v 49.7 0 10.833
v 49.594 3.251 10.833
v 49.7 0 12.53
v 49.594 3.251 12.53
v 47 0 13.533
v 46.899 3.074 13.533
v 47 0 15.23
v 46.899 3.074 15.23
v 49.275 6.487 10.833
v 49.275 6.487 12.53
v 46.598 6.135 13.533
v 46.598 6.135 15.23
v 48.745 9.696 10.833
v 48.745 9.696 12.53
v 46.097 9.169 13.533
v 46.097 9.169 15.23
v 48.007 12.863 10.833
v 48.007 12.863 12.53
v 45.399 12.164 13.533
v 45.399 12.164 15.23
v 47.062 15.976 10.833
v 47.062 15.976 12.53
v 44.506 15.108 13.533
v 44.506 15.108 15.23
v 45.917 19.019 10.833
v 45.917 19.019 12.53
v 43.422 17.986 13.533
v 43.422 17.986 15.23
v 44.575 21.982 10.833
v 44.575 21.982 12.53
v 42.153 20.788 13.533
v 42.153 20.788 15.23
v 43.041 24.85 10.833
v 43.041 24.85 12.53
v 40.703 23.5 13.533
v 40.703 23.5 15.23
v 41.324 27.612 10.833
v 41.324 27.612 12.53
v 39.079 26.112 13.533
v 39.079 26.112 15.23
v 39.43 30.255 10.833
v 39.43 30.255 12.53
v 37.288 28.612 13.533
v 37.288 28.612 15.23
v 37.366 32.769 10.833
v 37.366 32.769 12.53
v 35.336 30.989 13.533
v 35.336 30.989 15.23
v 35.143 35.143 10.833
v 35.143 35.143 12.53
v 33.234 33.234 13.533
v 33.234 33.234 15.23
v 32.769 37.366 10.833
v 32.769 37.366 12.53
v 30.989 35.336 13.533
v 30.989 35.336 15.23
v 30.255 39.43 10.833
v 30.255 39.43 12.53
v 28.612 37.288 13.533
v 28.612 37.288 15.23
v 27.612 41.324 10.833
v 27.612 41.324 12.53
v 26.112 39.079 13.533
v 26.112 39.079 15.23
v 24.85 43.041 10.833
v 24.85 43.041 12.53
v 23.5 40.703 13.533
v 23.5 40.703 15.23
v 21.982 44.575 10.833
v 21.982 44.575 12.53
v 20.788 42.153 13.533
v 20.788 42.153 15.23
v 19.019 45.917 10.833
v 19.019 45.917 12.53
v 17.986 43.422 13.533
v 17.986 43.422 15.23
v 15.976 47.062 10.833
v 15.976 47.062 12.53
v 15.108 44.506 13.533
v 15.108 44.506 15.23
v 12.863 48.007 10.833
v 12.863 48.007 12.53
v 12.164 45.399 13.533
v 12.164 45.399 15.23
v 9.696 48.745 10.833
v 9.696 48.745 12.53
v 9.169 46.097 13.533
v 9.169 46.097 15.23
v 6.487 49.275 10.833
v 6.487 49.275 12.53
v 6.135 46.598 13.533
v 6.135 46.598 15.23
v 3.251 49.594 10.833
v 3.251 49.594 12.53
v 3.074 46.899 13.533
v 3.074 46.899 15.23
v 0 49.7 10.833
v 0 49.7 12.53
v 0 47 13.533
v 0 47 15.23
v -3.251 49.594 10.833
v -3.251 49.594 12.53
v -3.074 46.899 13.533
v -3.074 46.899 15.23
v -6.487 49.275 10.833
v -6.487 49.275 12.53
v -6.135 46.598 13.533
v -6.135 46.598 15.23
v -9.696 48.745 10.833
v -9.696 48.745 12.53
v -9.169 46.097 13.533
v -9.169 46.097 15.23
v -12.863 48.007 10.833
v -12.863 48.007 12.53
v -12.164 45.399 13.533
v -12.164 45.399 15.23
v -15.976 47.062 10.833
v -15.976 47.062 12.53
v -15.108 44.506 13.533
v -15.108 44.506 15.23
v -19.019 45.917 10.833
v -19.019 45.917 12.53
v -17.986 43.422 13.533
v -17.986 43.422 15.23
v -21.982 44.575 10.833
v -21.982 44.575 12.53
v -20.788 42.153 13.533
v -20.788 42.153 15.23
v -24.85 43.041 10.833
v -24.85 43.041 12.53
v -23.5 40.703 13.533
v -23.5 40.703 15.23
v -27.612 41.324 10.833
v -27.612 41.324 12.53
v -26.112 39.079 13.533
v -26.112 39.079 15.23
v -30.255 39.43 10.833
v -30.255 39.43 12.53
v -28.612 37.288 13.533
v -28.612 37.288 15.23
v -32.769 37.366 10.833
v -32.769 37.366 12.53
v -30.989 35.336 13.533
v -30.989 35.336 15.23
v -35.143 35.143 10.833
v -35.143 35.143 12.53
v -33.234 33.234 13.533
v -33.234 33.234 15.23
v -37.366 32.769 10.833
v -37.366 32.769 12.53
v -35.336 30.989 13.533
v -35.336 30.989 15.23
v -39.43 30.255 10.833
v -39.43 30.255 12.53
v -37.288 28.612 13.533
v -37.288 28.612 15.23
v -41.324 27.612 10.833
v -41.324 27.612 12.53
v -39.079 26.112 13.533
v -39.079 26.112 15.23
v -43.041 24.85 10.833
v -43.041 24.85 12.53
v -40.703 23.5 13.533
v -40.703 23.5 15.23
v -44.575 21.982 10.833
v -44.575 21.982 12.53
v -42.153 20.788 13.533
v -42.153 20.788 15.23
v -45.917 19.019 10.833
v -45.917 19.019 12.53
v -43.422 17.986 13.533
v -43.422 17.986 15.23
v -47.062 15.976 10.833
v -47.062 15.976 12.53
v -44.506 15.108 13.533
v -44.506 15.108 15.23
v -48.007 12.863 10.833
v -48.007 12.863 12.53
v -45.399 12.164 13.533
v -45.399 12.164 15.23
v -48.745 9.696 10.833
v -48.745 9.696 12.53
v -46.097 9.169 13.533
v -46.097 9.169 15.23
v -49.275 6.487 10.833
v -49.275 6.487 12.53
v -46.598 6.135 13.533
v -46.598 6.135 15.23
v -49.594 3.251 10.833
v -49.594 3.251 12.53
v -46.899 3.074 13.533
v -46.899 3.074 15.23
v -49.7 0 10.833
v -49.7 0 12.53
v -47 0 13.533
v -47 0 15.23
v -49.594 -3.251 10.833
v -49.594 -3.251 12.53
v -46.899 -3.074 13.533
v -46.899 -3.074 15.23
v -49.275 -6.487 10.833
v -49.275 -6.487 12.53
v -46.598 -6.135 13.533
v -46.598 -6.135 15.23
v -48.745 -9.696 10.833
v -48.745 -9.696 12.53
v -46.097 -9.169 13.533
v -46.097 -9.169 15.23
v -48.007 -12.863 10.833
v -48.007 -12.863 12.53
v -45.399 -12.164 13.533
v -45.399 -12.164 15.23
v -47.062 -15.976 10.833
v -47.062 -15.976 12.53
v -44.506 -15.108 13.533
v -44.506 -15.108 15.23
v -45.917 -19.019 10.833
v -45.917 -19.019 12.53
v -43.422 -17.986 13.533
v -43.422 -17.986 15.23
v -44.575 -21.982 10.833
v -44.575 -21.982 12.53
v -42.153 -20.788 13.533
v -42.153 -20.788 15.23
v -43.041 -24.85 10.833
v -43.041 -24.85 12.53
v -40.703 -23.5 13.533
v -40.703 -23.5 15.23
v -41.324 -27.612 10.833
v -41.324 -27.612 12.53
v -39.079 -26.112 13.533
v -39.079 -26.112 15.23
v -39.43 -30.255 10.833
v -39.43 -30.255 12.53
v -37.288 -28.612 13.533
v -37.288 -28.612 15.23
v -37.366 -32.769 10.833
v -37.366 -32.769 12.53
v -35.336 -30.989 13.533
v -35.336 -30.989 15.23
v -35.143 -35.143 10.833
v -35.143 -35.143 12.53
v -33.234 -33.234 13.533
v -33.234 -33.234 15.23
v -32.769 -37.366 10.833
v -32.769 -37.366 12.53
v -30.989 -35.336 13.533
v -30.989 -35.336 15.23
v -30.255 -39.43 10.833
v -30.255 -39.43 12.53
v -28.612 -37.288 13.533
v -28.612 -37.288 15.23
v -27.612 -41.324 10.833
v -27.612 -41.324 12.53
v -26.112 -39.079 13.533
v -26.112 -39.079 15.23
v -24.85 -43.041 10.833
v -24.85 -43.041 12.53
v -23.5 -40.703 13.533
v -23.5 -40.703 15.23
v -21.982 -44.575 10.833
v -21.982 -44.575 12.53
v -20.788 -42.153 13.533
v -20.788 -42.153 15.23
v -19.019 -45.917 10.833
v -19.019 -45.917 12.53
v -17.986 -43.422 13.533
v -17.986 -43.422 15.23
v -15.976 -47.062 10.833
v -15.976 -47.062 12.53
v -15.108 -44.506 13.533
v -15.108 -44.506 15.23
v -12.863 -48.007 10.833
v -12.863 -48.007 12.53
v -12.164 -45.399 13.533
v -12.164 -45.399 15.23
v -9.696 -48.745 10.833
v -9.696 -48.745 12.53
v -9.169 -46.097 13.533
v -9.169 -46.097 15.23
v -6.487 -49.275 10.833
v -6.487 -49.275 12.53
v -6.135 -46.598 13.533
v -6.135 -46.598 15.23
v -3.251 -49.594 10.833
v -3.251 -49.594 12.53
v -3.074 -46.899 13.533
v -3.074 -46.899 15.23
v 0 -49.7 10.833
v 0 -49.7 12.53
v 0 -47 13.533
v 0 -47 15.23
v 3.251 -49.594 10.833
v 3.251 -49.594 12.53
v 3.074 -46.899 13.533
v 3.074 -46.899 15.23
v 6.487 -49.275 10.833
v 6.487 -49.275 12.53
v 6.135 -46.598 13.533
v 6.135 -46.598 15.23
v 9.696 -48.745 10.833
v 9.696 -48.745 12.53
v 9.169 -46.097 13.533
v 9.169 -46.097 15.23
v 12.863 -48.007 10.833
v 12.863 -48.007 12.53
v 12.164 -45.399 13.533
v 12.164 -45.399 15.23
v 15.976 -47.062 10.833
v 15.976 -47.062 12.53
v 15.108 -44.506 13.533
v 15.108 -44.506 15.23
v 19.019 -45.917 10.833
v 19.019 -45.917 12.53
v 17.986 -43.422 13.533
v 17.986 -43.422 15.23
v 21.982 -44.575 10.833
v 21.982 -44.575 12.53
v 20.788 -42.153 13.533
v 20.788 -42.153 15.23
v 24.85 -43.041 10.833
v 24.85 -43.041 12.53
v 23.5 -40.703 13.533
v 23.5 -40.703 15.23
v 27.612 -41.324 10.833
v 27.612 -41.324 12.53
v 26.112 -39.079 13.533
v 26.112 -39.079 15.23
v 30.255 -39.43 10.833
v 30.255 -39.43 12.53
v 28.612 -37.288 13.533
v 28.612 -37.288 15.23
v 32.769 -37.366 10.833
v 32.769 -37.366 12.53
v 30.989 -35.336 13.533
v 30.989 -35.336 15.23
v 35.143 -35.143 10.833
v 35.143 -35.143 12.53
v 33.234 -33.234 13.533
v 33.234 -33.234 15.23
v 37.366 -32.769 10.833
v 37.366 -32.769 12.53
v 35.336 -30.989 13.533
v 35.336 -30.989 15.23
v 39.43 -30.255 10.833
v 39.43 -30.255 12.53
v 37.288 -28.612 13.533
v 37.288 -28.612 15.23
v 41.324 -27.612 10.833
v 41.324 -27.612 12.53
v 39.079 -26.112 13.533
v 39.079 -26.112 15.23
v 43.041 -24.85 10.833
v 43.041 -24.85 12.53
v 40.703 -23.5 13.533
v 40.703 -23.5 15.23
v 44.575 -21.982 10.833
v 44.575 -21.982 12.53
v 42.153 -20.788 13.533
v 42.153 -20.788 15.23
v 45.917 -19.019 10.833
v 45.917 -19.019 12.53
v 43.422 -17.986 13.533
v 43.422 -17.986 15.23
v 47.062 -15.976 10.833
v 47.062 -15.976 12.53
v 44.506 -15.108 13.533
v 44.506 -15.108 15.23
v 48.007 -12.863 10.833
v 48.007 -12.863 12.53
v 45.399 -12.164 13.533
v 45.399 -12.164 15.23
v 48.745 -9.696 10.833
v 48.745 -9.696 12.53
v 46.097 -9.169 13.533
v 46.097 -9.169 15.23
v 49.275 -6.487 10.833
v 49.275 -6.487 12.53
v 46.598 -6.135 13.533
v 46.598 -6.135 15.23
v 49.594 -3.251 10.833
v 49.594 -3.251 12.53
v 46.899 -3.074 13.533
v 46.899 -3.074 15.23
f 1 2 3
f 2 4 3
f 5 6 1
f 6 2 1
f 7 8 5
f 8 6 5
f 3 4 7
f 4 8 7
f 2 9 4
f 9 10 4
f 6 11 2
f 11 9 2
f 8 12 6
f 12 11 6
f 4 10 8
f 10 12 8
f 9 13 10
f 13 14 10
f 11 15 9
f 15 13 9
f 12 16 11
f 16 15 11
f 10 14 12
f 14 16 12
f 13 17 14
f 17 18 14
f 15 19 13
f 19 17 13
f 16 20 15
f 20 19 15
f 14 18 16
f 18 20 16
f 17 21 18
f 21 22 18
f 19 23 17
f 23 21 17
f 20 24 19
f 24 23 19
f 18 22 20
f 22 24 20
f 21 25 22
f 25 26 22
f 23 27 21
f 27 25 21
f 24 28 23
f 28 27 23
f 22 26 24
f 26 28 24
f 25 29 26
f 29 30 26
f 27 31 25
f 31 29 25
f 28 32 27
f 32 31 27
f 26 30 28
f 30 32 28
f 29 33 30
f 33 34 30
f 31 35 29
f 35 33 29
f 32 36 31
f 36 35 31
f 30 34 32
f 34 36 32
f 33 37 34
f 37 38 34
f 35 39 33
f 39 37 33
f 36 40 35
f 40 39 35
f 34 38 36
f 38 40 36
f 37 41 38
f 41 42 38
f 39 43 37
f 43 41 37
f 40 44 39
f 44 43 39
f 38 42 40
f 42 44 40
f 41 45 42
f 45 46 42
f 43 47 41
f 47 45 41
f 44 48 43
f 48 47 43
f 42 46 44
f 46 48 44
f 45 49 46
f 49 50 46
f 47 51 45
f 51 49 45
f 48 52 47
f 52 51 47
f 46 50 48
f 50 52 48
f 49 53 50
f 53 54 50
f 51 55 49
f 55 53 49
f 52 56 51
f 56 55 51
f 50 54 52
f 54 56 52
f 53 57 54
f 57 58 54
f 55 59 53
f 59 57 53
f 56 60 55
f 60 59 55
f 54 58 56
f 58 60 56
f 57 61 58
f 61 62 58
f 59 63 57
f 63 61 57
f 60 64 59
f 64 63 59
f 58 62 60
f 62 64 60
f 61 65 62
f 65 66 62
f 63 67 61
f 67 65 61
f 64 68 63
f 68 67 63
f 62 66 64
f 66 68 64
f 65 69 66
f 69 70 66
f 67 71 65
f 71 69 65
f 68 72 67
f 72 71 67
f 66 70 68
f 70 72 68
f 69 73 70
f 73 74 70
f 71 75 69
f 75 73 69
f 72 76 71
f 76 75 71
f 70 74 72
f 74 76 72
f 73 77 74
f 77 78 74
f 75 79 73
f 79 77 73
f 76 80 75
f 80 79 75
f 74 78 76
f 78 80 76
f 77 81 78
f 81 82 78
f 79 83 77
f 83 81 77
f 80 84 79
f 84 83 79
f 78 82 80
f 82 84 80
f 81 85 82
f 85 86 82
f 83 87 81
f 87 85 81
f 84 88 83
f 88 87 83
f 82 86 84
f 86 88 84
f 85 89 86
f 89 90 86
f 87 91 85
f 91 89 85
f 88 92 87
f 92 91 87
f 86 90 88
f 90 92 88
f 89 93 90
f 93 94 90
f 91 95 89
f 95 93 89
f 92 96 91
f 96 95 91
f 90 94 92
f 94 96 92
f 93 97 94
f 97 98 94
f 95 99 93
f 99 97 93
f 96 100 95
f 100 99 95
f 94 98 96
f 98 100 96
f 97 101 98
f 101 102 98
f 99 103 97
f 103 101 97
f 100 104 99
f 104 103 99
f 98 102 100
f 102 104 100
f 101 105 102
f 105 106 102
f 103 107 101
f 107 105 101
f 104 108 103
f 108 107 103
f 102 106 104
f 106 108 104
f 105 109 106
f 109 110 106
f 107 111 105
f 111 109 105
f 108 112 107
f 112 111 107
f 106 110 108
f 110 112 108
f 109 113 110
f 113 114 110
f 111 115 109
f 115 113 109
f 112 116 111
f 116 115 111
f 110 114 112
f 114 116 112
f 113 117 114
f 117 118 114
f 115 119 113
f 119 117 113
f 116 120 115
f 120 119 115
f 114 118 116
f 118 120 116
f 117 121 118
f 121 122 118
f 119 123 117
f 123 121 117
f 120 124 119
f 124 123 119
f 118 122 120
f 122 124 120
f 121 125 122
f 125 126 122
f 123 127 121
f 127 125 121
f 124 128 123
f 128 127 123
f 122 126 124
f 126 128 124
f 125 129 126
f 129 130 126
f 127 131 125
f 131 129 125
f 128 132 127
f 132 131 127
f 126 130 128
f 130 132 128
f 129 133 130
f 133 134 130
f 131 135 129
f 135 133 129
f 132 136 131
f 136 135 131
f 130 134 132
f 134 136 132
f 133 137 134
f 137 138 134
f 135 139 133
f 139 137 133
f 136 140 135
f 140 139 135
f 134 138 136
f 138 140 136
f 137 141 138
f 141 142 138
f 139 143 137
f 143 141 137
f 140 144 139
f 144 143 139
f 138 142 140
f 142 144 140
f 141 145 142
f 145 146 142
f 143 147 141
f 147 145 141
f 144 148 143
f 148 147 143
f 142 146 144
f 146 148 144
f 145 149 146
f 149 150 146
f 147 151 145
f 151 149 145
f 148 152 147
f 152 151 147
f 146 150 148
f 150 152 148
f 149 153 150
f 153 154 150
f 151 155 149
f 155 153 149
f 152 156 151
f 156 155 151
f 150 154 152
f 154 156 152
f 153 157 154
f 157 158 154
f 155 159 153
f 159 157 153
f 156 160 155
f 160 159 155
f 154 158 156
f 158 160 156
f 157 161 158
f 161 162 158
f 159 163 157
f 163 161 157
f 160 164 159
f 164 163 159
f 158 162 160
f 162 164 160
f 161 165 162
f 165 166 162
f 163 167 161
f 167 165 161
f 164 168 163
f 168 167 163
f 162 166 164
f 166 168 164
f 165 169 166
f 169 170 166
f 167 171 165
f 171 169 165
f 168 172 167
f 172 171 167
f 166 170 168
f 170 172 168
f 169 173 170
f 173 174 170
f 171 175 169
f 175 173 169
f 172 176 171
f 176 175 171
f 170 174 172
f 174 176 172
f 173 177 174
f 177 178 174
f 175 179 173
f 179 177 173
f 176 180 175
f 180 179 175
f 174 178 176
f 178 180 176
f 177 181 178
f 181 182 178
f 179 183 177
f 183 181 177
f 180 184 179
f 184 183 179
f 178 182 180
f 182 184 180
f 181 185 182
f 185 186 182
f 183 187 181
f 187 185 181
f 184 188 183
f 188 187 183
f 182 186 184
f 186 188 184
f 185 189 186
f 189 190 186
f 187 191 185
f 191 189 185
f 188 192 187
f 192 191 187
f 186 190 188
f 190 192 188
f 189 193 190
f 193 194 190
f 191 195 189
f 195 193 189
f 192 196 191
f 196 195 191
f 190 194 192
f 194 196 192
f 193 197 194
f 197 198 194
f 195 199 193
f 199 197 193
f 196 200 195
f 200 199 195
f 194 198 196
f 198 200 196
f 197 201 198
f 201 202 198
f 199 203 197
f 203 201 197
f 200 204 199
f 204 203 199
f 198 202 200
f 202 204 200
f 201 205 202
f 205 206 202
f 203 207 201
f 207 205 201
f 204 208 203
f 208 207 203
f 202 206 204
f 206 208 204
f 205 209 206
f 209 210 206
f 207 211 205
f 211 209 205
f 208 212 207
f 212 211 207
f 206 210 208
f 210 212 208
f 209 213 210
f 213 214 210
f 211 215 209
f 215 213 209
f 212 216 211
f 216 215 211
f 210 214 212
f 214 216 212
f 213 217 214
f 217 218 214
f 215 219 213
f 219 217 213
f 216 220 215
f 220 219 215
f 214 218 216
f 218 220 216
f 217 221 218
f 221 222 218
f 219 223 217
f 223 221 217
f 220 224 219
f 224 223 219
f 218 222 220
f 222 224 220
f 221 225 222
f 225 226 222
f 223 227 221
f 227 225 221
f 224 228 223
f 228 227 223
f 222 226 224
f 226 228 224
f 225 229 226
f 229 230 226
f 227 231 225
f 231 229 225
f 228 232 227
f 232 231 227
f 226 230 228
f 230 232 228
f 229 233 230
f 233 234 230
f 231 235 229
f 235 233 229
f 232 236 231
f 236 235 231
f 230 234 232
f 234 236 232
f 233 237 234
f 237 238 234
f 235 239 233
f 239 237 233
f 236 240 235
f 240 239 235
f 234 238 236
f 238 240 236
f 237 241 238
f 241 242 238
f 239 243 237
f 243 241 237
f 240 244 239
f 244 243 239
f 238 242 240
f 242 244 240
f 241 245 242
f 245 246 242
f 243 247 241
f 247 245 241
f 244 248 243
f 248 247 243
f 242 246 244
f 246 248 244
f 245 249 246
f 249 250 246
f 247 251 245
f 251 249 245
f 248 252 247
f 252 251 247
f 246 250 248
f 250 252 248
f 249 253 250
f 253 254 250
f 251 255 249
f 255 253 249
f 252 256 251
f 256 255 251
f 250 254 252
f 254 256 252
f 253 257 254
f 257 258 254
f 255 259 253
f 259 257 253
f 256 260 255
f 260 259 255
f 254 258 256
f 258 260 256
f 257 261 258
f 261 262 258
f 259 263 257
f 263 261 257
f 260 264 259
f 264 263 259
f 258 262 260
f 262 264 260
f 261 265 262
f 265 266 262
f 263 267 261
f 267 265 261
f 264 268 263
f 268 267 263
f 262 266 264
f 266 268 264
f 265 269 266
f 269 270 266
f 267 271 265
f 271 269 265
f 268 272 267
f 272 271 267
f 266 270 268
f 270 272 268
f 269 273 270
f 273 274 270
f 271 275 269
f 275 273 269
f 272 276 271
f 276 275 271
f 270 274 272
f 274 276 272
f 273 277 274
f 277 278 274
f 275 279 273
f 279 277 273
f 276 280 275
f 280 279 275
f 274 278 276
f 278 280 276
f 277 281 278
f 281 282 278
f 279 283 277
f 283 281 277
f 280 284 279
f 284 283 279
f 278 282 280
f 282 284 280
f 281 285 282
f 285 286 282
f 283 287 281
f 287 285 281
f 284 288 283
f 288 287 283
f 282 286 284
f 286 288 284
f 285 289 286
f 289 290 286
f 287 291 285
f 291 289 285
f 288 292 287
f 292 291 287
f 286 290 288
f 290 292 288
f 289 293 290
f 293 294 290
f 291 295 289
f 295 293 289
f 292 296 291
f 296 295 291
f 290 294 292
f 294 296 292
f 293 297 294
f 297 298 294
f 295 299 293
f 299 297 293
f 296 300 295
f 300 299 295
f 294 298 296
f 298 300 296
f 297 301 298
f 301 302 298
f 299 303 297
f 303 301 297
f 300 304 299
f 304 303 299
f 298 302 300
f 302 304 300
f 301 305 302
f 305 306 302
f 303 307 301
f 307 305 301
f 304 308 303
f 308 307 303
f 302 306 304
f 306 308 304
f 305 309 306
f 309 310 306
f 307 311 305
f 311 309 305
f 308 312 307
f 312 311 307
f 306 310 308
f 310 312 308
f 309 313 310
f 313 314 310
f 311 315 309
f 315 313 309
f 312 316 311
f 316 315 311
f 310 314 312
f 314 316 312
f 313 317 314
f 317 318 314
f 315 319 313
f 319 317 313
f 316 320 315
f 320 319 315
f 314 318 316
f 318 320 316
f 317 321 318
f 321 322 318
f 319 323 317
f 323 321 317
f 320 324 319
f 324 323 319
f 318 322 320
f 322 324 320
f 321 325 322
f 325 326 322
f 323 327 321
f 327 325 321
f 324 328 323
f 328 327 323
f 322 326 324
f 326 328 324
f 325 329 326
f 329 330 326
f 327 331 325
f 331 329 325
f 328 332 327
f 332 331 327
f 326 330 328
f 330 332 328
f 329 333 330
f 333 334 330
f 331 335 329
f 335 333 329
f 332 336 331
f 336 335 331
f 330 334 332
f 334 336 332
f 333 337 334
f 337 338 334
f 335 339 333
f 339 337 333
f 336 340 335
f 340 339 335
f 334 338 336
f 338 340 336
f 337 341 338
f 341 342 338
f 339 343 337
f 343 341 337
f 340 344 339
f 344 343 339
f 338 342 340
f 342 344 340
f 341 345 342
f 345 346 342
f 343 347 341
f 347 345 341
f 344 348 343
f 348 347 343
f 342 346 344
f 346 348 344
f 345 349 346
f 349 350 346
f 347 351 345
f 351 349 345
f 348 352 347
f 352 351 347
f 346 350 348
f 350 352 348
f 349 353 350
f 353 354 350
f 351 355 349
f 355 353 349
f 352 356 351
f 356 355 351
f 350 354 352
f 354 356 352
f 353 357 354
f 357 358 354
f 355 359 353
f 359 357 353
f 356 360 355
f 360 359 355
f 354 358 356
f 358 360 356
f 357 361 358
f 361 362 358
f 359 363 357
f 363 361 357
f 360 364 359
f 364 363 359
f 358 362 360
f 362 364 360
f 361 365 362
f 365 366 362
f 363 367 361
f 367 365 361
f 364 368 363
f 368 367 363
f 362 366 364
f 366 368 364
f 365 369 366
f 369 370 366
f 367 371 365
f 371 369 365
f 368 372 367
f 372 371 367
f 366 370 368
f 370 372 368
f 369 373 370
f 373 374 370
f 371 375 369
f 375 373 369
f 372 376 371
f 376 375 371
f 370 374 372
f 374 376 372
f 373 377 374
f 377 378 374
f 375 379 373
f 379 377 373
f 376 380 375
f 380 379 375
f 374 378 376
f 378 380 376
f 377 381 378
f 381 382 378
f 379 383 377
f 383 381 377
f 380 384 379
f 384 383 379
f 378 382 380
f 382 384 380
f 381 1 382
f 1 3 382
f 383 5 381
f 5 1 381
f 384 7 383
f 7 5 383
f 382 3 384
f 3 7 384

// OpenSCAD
include <../lib/servo-duct-manifold-lib.scad>;
$fn = 96;
elbow_45_gasket();
